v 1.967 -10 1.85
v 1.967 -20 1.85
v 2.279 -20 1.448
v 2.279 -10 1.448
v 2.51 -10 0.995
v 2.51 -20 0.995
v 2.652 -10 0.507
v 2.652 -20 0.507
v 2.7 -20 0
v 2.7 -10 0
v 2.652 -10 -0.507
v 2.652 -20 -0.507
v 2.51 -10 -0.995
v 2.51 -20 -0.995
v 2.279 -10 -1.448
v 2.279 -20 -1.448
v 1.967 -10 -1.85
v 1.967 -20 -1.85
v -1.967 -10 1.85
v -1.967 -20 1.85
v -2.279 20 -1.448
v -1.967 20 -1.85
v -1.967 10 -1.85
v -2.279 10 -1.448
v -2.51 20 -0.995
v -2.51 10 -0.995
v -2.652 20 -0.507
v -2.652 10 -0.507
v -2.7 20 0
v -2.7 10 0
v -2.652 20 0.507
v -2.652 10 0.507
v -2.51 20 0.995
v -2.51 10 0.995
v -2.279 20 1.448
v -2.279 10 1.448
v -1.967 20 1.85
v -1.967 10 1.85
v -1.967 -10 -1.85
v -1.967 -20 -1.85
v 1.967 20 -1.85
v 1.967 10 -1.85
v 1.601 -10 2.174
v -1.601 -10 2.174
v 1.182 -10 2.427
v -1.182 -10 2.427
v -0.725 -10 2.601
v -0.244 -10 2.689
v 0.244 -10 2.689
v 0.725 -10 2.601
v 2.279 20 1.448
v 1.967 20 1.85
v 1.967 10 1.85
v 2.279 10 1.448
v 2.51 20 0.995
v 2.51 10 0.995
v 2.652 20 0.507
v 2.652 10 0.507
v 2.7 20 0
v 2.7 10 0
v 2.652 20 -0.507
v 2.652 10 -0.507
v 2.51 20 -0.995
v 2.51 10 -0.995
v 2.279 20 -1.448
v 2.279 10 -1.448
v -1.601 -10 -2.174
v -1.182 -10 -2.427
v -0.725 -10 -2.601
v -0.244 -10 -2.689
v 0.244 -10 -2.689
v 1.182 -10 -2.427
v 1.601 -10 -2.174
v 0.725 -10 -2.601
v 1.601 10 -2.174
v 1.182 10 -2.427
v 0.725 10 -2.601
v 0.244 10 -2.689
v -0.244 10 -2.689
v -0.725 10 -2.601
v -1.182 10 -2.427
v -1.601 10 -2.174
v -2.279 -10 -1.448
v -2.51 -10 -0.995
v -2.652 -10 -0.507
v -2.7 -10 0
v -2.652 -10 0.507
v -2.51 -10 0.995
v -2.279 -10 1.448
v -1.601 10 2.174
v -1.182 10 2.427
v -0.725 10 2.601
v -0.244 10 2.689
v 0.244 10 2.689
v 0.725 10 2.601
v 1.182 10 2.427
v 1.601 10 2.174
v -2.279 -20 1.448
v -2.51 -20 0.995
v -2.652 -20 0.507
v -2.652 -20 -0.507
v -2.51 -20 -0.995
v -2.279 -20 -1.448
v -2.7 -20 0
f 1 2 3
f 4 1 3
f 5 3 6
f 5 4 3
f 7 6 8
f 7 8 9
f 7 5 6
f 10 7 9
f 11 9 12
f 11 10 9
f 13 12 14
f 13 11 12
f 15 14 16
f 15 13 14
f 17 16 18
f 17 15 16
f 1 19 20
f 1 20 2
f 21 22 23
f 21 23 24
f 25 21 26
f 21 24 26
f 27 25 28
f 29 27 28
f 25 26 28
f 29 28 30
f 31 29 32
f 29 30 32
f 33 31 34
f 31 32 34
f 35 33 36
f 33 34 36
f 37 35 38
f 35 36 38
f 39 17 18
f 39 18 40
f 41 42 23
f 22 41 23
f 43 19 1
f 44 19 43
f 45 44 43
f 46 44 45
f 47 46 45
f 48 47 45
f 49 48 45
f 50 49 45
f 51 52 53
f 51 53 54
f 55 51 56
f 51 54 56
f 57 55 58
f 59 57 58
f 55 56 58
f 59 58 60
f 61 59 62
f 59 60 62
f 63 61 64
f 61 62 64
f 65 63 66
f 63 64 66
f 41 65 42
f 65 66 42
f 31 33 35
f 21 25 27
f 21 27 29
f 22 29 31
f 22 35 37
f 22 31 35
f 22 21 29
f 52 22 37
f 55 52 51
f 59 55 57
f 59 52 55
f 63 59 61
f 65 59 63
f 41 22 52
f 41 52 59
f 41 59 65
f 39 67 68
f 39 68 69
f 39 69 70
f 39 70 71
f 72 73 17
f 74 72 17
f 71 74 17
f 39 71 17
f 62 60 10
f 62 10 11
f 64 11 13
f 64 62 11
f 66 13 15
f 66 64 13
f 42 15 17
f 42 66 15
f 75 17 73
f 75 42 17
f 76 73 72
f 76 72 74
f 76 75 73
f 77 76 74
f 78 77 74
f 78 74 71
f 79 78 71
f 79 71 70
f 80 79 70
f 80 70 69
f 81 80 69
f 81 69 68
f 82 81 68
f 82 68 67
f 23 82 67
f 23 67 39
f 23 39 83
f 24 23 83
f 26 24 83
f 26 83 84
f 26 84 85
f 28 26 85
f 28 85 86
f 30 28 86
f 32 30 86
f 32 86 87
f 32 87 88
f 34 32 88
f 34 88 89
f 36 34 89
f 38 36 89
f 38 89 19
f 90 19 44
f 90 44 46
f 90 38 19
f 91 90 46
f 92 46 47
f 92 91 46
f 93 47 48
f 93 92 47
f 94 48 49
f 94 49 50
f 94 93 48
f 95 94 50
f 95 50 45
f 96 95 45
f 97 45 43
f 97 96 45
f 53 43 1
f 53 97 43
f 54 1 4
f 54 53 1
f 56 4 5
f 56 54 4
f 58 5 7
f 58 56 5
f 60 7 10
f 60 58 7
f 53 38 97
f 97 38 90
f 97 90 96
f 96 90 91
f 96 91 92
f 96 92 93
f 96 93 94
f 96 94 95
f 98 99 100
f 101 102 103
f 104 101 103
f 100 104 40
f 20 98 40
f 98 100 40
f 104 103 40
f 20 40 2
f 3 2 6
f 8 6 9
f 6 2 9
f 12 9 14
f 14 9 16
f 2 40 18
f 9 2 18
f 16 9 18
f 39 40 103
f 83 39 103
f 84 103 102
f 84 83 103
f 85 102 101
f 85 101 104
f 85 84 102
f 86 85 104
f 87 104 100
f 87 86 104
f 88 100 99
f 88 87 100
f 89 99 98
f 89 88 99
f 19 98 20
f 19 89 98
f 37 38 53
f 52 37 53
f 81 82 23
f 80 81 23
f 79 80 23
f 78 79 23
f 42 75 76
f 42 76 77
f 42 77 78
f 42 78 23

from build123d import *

# Parameters (mm, degrees)
CROQUIS1_R              = 2.7
SALIENTE_EXTRUIR1_DEPTH = 10
SALIENTE_EXTRUIR2_DEPTH = 10


with BuildPart() as part:
    # Croquis1 → Saliente-Extruir1 (new body, symmetric)
    with BuildSketch(Plane(origin=(0, 0, 0), x_dir=(1, 0, 0), z_dir=(0, 1, 0))):
        Circle(CROQUIS1_R)
    extrude(amount=SALIENTE_EXTRUIR1_DEPTH, both=True)

    # Croquis2 → Saliente-Extruir2 (add)
    with BuildSketch(Plane(origin=(0, 10, 0), x_dir=(1, 0, 0), z_dir=(0, 1, 0))):
        with BuildLine():
            Line((1.966596, 1.85), (-1.966596, 1.85))
            ThreePointArc((-1.966596, 1.85), (-2.7, 0), (-1.966596, -1.85))
            Line((-1.966596, -1.85), (1.966596, -1.85))
            ThreePointArc((1.966596, -1.85), (2.7, 0), (1.966596, 1.85))
        make_face()
    saliente_extruir2 = extrude(amount=SALIENTE_EXTRUIR2_DEPTH)

    # Simetría1: Saliente-Extruir2 across plane
    add(saliente_extruir2.mirror(Plane.ZX))


solid = part.part
